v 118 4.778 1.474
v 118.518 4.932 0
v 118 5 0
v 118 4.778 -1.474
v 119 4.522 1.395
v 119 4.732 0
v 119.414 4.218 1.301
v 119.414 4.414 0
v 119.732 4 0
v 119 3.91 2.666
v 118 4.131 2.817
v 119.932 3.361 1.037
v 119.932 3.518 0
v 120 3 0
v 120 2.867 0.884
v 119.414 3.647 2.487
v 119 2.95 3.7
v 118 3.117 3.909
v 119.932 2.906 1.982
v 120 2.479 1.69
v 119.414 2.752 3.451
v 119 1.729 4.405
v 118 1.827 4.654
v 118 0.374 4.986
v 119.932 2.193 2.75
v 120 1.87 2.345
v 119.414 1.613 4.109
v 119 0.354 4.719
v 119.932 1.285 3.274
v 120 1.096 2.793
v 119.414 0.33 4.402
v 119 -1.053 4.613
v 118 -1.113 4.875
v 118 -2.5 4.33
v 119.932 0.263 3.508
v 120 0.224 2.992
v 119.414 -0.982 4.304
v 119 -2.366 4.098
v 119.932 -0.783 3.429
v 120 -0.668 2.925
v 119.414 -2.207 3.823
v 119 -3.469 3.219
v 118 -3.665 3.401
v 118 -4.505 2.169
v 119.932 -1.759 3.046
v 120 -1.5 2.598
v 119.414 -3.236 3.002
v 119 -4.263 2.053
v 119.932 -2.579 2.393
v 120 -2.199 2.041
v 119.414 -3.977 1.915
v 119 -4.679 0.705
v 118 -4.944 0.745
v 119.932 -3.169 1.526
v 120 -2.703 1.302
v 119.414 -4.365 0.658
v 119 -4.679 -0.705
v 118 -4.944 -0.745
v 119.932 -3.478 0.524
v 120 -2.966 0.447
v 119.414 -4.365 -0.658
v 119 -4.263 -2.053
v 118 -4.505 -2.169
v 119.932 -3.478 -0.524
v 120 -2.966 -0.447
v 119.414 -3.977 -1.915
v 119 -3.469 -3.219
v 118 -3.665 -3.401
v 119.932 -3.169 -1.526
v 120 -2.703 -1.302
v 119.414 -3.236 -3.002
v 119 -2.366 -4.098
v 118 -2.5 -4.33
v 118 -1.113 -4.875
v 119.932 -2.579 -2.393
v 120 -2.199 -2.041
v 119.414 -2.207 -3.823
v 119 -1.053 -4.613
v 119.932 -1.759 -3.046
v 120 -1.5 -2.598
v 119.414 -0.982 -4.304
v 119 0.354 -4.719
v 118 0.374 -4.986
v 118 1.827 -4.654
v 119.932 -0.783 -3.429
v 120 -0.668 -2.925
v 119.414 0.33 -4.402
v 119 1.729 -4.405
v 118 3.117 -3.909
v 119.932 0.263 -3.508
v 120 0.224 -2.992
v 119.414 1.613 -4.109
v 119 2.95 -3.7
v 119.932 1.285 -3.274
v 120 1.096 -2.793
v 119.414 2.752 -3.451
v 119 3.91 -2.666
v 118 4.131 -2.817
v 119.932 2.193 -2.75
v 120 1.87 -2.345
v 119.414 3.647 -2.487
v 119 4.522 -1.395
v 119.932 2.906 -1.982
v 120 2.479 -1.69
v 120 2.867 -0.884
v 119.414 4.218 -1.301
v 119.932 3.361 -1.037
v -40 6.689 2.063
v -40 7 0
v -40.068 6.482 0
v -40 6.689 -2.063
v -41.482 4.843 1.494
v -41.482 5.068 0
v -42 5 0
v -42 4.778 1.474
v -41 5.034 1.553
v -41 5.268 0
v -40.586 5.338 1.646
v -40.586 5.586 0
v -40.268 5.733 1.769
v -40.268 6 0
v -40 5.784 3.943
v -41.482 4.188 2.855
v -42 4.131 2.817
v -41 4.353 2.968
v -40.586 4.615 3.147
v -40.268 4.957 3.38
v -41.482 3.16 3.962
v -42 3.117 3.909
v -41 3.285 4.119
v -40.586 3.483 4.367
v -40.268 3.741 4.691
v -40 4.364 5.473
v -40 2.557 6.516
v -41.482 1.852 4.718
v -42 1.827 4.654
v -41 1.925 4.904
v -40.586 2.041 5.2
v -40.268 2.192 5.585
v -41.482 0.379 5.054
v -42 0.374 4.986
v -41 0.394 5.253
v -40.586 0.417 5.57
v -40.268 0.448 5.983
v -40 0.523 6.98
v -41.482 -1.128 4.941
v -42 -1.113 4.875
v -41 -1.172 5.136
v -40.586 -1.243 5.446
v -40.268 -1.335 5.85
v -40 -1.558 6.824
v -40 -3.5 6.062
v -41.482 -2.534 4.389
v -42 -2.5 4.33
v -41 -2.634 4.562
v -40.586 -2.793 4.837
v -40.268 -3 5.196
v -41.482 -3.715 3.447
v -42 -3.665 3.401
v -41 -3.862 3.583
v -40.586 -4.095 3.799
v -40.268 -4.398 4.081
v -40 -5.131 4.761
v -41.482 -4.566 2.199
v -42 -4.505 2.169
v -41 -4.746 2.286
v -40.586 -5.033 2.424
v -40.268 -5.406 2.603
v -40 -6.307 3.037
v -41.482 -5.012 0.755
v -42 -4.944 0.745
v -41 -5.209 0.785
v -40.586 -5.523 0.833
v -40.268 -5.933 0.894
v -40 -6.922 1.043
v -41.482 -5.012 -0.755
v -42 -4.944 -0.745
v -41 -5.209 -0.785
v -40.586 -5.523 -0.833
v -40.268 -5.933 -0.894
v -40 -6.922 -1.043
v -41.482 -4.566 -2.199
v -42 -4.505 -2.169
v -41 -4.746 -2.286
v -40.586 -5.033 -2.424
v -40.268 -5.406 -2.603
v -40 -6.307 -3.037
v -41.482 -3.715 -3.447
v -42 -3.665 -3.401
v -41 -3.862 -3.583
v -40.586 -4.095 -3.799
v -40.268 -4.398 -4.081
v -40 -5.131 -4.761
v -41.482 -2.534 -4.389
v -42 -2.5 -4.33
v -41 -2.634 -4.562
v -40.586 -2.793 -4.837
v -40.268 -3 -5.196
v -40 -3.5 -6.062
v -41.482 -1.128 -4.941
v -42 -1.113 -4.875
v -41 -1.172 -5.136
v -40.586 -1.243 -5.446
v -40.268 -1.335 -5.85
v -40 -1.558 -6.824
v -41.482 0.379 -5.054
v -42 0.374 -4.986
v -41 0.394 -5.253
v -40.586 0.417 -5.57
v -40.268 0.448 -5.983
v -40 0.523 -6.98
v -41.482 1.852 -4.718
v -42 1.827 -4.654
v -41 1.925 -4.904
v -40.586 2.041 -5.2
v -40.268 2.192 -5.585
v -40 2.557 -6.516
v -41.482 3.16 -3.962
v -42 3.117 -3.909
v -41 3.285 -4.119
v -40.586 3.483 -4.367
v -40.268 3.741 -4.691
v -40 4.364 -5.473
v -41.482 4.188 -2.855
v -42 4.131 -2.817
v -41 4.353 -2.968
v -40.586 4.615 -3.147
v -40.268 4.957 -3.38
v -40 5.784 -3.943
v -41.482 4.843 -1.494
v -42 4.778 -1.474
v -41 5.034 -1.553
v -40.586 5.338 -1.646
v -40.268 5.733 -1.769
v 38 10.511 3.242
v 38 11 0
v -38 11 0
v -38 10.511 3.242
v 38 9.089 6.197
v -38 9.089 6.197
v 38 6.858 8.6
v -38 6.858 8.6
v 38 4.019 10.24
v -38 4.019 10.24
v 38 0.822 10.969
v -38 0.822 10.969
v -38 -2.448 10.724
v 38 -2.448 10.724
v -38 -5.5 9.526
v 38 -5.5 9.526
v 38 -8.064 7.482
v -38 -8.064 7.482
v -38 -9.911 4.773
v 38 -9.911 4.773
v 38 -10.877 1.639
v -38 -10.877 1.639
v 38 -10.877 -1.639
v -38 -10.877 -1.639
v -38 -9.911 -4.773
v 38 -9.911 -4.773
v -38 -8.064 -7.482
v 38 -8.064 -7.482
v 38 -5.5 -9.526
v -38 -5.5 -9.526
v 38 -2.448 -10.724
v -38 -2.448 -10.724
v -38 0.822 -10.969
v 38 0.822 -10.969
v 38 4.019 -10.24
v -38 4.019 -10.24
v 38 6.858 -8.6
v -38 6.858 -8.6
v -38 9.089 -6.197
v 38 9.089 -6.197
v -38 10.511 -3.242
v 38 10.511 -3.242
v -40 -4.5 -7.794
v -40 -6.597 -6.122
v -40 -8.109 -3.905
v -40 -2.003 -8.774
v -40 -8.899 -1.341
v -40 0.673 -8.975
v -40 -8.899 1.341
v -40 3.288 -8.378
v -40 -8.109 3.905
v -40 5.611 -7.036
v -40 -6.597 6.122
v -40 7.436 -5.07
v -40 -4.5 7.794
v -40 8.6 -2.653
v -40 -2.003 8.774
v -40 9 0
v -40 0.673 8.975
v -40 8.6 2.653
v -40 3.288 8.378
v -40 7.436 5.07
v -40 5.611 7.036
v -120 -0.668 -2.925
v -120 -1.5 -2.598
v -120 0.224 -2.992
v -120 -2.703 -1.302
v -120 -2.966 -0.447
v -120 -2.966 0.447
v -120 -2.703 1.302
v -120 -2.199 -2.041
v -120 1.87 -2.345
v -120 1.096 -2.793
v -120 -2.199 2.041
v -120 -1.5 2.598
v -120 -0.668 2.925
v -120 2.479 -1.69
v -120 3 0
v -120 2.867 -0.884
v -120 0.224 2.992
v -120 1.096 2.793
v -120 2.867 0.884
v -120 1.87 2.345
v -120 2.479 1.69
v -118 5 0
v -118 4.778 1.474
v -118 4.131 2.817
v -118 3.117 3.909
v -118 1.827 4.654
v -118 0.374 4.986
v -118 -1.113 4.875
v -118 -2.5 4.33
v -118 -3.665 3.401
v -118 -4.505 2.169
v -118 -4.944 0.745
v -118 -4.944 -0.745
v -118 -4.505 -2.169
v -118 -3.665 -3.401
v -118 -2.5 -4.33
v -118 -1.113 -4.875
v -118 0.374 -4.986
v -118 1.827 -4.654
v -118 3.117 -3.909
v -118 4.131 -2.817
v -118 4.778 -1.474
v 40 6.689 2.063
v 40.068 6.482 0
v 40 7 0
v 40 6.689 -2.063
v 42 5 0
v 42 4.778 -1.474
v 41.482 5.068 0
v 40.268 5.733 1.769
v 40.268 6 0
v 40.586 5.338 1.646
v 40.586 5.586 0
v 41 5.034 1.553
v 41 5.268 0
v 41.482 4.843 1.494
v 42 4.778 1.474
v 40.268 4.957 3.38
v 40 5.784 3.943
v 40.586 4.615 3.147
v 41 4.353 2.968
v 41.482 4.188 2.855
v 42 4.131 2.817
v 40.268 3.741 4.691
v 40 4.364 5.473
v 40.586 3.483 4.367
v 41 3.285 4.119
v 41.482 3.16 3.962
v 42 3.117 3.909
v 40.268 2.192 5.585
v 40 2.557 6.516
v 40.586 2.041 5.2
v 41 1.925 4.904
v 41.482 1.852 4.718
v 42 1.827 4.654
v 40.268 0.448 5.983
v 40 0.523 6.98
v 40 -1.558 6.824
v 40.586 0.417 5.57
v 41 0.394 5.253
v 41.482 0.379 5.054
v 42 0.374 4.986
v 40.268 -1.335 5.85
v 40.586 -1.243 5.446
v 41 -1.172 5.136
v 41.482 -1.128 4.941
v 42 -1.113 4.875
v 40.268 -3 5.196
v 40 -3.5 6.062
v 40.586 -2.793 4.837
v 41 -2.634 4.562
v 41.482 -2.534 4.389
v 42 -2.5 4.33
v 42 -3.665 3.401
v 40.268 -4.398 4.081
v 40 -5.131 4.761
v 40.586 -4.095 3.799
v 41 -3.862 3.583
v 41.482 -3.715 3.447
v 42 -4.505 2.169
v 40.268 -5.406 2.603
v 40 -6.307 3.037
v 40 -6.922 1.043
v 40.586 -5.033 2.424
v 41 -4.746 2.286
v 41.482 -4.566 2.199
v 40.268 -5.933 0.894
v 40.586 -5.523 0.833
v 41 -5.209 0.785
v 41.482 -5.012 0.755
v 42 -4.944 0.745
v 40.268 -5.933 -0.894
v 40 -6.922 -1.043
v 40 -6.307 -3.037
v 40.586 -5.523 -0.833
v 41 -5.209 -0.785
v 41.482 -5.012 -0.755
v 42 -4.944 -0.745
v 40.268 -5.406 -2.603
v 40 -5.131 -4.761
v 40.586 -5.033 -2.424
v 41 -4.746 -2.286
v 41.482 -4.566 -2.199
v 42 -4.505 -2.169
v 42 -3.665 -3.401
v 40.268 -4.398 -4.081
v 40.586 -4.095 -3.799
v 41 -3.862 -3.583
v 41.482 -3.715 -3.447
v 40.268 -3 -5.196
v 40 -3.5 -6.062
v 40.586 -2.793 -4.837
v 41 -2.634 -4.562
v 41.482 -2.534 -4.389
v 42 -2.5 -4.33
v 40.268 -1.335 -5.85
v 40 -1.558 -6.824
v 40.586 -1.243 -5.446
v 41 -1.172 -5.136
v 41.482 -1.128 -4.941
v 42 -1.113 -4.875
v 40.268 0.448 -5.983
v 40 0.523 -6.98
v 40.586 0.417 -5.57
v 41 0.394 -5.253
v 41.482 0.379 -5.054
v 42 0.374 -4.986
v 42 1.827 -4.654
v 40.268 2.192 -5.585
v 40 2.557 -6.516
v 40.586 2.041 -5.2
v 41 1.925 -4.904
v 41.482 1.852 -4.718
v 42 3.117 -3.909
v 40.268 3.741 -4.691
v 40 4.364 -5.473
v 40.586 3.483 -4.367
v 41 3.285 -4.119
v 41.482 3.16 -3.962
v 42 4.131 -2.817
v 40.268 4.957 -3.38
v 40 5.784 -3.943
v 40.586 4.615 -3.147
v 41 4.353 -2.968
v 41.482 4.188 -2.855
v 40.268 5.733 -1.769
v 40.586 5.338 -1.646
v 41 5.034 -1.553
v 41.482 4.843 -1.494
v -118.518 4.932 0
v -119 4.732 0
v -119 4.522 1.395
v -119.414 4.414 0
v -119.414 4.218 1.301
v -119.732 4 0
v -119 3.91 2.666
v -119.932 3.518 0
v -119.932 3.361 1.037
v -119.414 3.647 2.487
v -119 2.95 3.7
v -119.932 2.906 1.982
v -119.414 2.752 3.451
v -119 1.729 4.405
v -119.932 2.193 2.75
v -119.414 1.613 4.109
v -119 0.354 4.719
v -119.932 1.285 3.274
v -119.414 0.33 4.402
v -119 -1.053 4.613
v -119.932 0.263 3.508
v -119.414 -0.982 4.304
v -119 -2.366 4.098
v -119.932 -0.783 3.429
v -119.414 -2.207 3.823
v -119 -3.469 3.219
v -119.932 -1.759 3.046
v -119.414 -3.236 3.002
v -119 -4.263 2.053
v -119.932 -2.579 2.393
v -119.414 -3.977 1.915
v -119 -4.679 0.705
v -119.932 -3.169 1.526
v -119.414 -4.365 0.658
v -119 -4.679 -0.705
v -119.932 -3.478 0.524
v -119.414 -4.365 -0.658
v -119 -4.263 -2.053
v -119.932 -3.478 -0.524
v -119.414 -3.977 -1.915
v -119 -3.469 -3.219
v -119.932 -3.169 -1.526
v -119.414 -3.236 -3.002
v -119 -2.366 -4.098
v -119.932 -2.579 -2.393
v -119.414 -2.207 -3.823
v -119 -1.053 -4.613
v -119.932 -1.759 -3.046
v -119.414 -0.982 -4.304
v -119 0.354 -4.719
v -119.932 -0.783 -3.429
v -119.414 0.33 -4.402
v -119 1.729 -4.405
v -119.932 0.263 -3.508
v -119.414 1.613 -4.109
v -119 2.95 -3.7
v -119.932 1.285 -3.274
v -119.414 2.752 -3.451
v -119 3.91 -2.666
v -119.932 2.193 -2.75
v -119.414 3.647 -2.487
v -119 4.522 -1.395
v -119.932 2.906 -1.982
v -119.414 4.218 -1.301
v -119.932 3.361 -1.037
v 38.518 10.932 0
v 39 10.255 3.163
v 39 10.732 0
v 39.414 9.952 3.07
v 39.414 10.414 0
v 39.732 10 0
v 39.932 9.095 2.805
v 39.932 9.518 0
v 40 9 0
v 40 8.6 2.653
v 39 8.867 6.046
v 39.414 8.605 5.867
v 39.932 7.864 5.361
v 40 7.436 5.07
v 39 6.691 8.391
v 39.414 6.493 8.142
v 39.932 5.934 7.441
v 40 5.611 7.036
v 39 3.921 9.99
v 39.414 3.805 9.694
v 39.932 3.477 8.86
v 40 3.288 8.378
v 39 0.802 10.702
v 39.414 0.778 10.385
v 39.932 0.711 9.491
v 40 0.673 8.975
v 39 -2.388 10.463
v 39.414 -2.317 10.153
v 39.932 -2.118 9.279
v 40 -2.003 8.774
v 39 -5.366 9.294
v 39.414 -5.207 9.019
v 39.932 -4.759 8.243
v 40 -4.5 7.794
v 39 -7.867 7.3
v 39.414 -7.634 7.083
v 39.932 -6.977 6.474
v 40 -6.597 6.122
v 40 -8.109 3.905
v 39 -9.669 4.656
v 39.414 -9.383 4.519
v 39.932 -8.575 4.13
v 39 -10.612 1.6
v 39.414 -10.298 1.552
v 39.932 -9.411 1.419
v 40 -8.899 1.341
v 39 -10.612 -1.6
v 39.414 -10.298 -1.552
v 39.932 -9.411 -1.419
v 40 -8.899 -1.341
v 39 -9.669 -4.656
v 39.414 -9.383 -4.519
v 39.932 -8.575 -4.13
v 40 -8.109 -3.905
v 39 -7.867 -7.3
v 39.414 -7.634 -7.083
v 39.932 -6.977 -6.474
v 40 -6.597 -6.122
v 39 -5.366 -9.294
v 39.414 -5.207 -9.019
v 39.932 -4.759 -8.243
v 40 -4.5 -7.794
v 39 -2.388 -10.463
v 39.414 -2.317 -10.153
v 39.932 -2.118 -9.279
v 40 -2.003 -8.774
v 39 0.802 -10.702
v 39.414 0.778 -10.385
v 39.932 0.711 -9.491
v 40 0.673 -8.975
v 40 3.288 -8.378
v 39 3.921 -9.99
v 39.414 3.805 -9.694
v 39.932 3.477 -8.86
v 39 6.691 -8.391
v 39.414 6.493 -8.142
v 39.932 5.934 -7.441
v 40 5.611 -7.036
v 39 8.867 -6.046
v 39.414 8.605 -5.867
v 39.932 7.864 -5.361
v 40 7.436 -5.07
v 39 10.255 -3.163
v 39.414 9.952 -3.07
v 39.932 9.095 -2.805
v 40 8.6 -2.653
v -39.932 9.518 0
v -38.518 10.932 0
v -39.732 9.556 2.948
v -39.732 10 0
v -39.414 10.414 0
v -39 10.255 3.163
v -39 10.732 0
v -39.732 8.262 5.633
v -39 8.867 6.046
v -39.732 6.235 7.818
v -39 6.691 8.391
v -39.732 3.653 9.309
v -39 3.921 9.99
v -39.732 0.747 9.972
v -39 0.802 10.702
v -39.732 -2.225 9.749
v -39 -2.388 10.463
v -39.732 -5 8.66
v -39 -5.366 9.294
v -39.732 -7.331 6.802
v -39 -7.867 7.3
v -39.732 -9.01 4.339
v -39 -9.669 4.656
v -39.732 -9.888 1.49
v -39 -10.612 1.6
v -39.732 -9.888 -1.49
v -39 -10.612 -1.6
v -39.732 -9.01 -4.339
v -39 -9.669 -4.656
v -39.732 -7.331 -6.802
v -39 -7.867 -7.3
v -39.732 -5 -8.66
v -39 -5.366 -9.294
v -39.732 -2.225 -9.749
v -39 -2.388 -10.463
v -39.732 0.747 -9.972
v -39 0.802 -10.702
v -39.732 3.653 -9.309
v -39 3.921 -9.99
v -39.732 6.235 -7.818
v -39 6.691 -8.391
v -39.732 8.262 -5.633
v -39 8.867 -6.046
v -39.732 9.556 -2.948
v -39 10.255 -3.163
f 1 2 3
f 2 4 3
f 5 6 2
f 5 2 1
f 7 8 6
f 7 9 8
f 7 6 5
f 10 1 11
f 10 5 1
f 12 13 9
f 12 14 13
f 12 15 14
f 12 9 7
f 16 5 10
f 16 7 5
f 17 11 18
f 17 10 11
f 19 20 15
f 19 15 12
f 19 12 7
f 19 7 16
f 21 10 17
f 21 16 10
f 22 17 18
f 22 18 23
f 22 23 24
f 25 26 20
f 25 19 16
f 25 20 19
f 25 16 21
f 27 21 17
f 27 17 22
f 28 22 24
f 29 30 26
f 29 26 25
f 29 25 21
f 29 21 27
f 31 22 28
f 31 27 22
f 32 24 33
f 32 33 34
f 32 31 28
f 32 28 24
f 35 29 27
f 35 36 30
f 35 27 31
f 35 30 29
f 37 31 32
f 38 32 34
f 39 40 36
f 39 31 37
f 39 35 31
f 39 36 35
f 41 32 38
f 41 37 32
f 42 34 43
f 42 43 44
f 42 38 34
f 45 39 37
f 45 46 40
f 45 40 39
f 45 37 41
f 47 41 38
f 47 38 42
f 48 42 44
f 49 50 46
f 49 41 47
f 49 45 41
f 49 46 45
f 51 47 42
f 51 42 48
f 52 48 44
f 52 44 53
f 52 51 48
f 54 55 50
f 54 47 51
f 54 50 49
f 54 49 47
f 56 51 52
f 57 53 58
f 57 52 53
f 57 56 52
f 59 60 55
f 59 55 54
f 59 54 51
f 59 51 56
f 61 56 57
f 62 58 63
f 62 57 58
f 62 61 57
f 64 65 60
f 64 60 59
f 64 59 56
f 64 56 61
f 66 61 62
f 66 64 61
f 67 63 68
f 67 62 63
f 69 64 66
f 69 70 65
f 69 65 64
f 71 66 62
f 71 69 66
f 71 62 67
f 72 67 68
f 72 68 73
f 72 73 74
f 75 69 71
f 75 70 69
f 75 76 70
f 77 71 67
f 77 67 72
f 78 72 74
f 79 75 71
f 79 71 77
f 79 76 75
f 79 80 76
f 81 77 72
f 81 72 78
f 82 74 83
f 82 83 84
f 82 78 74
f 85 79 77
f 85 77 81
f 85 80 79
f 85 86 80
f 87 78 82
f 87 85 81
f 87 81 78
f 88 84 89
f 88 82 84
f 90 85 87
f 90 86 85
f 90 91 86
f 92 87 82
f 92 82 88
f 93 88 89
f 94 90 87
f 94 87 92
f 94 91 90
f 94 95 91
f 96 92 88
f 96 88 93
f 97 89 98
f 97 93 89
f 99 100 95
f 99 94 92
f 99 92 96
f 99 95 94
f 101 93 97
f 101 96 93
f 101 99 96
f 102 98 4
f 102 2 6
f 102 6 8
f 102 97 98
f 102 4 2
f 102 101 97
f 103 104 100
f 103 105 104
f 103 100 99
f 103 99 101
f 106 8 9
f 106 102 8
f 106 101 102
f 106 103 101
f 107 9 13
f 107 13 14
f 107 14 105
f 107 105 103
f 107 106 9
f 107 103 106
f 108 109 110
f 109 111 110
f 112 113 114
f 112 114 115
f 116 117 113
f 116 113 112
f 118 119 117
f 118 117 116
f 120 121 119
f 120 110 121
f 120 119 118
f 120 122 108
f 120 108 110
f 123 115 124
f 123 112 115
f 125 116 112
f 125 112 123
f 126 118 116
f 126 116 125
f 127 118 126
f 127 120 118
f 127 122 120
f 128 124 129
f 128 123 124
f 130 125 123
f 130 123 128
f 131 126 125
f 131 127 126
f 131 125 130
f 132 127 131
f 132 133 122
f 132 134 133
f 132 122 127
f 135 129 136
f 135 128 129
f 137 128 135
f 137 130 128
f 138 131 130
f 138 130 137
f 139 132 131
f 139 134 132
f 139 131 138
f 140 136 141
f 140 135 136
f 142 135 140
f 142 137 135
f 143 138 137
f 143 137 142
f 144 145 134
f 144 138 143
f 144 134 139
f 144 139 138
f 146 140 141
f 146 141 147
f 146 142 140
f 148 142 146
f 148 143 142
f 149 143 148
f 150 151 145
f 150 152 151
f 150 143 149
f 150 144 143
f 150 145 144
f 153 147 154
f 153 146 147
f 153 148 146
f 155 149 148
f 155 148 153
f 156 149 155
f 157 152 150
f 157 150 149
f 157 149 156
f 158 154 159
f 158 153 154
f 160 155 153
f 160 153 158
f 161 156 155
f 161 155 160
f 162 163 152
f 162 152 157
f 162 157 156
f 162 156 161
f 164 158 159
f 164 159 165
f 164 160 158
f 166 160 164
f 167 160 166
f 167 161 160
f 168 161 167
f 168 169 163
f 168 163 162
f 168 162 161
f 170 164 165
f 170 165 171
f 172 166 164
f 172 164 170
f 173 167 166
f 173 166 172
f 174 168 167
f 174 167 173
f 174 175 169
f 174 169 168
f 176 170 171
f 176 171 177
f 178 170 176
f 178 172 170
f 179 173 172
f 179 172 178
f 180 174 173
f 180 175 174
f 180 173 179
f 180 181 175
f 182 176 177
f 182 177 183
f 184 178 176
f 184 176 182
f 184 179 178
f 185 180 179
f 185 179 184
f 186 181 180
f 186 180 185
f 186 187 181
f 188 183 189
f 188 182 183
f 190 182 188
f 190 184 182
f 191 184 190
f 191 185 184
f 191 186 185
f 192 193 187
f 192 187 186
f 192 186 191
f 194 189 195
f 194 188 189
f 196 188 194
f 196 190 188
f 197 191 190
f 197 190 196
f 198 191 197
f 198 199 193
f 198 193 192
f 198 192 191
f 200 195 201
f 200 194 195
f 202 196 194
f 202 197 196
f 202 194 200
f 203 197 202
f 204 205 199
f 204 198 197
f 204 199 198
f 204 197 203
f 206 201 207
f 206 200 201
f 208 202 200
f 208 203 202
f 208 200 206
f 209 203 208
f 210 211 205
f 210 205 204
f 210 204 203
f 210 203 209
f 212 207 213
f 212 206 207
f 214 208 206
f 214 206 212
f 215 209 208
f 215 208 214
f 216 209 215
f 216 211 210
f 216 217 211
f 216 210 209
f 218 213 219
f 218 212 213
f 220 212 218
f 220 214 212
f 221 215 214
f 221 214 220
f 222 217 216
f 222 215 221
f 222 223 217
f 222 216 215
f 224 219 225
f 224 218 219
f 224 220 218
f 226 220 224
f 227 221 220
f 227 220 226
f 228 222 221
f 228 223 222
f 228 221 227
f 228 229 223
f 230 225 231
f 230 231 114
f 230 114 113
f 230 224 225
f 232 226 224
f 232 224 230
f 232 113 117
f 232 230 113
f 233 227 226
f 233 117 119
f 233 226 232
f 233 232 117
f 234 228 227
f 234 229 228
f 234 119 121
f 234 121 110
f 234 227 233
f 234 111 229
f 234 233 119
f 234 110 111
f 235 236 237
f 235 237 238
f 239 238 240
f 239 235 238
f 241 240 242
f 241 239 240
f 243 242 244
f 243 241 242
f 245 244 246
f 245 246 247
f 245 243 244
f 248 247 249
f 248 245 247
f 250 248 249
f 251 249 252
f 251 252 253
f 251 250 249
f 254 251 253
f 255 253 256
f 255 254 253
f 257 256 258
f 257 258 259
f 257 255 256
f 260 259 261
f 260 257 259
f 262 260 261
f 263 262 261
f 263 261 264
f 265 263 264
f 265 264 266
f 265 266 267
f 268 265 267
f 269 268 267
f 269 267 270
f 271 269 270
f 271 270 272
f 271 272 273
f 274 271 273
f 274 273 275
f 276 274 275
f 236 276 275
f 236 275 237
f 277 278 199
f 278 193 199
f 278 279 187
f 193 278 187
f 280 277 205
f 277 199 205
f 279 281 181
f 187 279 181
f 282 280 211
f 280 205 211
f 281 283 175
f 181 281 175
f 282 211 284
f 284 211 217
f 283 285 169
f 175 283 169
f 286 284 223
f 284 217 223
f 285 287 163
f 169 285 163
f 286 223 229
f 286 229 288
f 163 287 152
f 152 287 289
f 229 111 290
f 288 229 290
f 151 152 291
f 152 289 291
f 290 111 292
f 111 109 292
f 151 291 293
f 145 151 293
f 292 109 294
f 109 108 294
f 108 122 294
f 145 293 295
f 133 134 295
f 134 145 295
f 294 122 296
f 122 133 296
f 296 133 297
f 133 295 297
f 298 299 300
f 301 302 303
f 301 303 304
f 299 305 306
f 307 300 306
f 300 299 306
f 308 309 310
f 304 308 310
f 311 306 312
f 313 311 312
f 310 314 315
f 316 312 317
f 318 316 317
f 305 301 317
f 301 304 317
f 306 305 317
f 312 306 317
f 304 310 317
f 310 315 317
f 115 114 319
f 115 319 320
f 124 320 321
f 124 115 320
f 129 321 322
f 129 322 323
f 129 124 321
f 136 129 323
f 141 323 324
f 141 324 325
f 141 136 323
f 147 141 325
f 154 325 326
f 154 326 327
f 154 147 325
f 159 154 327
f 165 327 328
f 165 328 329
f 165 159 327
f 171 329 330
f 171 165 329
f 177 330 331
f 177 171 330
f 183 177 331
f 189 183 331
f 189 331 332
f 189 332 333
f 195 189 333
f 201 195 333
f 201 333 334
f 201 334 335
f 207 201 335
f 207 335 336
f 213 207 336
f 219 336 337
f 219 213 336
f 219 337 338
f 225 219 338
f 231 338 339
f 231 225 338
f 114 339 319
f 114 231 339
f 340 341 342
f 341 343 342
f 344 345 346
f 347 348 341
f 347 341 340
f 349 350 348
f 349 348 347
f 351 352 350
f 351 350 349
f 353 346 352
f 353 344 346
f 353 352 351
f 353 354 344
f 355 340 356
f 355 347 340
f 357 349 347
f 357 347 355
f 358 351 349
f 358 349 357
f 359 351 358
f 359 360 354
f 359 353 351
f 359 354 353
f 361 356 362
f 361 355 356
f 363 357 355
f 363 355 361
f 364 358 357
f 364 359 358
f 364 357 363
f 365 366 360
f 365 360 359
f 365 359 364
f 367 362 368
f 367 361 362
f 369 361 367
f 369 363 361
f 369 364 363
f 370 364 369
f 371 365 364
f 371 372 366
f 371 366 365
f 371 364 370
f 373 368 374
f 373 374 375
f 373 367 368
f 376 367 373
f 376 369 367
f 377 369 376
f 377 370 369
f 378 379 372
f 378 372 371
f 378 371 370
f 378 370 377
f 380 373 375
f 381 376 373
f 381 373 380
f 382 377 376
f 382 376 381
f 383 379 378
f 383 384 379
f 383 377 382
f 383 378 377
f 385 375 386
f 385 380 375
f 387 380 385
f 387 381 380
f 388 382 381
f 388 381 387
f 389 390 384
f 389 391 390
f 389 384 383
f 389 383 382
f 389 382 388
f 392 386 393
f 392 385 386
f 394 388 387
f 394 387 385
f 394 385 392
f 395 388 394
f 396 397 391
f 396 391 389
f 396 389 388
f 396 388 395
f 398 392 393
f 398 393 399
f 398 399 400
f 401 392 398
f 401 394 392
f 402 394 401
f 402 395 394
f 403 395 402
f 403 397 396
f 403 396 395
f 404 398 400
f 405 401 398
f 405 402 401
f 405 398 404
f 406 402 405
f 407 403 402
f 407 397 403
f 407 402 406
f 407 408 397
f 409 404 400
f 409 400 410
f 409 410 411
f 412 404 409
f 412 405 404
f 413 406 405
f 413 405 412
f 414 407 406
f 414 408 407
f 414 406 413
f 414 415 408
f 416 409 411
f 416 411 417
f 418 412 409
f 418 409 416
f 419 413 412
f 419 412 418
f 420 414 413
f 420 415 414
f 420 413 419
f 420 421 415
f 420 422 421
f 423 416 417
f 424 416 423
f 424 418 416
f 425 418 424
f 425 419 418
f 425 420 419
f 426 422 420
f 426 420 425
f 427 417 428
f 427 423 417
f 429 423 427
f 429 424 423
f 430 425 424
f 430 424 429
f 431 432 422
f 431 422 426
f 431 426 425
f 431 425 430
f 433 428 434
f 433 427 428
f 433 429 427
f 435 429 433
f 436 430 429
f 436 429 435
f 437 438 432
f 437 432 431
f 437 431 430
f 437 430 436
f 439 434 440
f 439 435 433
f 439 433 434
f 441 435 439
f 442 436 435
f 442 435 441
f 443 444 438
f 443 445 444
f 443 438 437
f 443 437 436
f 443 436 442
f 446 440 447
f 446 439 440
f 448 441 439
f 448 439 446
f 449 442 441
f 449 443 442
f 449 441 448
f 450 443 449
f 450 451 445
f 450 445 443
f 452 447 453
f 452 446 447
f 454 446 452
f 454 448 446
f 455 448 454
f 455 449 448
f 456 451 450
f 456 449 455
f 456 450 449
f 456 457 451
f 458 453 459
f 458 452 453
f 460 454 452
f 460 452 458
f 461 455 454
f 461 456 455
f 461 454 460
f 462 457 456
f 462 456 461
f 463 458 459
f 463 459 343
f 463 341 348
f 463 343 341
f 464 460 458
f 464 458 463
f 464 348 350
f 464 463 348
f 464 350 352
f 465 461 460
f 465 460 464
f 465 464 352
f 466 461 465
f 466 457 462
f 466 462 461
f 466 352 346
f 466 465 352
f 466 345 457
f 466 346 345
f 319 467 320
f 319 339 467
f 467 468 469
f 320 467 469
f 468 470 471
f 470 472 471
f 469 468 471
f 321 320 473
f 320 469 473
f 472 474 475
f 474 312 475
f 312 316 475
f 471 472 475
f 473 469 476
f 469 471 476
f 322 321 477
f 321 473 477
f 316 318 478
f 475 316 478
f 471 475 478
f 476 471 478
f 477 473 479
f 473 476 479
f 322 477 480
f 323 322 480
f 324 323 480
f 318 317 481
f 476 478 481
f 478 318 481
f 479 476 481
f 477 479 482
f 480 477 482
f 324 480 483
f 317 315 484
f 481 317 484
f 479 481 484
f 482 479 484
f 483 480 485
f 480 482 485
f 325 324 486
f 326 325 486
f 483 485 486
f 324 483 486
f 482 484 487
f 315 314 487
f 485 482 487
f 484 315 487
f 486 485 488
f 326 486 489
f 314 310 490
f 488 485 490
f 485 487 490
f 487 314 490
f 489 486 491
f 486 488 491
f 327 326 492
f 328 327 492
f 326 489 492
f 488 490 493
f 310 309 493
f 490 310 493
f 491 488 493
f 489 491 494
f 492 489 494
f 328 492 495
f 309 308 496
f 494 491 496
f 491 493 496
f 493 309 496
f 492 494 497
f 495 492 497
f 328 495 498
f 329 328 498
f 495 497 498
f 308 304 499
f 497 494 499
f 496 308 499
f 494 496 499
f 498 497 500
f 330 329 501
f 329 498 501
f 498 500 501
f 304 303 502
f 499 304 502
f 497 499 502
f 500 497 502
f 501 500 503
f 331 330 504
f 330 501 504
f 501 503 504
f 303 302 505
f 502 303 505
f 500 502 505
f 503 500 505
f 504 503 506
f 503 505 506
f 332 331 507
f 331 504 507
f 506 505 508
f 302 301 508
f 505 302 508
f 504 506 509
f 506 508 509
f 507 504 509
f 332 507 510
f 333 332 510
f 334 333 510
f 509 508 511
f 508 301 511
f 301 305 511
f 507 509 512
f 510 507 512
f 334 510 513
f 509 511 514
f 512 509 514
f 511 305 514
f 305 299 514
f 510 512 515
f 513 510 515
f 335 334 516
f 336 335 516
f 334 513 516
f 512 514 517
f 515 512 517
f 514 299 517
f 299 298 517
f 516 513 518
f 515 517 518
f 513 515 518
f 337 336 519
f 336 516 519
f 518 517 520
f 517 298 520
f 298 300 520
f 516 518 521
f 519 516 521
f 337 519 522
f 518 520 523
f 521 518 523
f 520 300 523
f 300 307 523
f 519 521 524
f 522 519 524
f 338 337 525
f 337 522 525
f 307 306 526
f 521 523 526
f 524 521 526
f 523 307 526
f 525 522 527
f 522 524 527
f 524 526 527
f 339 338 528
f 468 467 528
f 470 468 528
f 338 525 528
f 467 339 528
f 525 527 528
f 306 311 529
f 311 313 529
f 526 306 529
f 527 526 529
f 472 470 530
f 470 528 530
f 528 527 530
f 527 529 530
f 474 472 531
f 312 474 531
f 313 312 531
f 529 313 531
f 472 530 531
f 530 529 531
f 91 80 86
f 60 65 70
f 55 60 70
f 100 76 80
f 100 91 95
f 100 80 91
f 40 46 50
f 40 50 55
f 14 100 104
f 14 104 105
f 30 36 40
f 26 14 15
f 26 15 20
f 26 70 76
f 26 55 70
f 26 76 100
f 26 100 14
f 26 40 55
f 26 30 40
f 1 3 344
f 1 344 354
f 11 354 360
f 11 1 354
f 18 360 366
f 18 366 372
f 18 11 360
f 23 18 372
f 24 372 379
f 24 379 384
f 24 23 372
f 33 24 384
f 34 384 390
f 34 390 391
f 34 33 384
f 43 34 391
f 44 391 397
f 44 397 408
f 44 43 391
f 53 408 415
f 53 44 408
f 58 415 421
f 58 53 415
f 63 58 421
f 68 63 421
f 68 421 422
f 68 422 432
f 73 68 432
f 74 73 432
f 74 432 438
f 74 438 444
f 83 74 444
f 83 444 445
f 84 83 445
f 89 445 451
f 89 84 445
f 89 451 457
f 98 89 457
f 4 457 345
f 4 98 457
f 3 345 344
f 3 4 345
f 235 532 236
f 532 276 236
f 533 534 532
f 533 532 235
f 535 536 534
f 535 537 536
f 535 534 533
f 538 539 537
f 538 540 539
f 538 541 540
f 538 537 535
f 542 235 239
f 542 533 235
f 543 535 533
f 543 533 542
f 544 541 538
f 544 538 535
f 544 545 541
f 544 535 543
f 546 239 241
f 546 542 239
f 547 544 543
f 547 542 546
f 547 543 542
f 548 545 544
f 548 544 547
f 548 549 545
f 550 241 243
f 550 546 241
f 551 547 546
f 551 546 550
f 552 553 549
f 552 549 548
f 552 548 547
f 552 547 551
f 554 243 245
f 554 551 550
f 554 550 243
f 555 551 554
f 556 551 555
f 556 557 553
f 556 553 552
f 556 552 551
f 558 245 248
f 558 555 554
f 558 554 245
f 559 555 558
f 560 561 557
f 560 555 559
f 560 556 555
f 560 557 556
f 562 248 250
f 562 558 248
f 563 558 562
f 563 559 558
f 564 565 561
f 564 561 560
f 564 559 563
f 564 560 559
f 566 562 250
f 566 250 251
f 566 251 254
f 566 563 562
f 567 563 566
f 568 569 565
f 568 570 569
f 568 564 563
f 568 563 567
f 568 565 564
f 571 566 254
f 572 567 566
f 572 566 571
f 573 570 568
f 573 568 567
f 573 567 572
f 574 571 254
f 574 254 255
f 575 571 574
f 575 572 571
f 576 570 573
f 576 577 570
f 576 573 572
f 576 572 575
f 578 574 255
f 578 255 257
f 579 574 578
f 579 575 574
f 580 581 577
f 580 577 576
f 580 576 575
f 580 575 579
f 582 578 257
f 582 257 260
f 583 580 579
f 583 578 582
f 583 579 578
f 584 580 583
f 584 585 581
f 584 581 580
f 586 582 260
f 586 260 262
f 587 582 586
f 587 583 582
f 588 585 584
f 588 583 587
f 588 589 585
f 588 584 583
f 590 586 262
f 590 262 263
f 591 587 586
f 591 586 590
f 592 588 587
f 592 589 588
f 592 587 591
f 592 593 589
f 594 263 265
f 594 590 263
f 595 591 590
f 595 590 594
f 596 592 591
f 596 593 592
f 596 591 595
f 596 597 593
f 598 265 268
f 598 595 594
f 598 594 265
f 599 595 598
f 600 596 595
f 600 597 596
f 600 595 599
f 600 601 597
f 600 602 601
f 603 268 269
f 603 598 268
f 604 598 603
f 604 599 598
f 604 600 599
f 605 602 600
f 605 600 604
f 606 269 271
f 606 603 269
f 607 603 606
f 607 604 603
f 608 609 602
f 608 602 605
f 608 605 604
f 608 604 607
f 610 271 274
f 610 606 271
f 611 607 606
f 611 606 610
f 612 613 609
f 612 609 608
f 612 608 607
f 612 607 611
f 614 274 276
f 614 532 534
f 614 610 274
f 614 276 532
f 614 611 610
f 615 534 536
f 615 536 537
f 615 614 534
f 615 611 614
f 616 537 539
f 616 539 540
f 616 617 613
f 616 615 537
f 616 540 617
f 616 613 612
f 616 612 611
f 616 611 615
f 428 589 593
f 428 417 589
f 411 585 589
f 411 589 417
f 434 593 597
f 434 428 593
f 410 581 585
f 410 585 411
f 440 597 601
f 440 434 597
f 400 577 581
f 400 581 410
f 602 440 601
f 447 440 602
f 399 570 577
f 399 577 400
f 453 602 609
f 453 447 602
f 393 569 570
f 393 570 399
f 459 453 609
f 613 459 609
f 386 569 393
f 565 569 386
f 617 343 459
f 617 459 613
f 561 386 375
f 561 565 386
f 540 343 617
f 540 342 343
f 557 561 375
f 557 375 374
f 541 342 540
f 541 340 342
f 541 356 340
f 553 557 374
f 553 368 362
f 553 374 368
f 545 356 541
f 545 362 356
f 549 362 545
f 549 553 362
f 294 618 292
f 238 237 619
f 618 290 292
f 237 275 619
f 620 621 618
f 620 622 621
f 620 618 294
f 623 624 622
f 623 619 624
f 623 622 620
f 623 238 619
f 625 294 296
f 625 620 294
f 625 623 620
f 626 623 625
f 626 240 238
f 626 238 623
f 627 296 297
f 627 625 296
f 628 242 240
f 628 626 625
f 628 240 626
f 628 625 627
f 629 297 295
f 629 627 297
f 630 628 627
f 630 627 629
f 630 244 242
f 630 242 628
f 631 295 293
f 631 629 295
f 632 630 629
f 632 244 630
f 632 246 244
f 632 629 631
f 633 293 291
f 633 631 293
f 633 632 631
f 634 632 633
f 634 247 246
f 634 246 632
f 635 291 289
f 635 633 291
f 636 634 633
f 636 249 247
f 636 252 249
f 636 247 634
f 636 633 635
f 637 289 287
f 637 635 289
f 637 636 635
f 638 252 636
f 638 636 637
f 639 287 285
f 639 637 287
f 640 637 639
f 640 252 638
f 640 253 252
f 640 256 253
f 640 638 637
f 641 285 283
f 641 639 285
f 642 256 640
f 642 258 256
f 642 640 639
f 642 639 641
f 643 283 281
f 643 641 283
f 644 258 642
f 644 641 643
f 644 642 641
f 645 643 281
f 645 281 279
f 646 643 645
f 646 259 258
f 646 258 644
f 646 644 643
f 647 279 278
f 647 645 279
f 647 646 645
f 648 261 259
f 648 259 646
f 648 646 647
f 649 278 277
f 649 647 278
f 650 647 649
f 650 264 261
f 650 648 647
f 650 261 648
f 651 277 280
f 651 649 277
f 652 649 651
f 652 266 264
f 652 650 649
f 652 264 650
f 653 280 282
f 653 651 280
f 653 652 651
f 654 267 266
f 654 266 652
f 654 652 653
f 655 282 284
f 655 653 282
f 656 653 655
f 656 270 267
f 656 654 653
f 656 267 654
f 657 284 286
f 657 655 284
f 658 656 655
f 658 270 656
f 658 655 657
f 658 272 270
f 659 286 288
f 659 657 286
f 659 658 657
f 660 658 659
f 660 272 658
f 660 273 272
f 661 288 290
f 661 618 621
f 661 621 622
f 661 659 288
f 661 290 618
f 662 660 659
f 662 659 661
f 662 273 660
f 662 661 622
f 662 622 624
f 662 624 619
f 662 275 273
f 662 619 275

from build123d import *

# Parameters (mm, degrees)
F0_R     = 11
F0_R_2   = 5
F1_DEPTH = 40
F2_DEPTH = 120
F3_R     = 2


with BuildPart() as f1:
    # F0 (on Right) → F1 (new body, symmetric)
    with BuildSketch(Plane.YZ):
        Circle(F0_R)
        Circle(F0_R_2, mode=Mode.SUBTRACT)
        Circle(F0_R_2)
    extrude(amount=F1_DEPTH, both=True)

    # F0 (on Right) → F2 (join, symmetric)
    with BuildSketch(Plane.YZ):
        Circle(F0_R_2)
    extrude(amount=F2_DEPTH, both=True)

    # F3
    f3_edges = [f1.edges().sort_by_distance(p)[0] for p in [
        (-40, -11, 0),
        (-40, -5, 0),
        (40, -11, 0),
        (40, -5, 0),
        (120, -5, 0),
        (-120, -5, 0),
    ]]
    fillet(f3_edges, radius=F3_R)


solid = f1.part
